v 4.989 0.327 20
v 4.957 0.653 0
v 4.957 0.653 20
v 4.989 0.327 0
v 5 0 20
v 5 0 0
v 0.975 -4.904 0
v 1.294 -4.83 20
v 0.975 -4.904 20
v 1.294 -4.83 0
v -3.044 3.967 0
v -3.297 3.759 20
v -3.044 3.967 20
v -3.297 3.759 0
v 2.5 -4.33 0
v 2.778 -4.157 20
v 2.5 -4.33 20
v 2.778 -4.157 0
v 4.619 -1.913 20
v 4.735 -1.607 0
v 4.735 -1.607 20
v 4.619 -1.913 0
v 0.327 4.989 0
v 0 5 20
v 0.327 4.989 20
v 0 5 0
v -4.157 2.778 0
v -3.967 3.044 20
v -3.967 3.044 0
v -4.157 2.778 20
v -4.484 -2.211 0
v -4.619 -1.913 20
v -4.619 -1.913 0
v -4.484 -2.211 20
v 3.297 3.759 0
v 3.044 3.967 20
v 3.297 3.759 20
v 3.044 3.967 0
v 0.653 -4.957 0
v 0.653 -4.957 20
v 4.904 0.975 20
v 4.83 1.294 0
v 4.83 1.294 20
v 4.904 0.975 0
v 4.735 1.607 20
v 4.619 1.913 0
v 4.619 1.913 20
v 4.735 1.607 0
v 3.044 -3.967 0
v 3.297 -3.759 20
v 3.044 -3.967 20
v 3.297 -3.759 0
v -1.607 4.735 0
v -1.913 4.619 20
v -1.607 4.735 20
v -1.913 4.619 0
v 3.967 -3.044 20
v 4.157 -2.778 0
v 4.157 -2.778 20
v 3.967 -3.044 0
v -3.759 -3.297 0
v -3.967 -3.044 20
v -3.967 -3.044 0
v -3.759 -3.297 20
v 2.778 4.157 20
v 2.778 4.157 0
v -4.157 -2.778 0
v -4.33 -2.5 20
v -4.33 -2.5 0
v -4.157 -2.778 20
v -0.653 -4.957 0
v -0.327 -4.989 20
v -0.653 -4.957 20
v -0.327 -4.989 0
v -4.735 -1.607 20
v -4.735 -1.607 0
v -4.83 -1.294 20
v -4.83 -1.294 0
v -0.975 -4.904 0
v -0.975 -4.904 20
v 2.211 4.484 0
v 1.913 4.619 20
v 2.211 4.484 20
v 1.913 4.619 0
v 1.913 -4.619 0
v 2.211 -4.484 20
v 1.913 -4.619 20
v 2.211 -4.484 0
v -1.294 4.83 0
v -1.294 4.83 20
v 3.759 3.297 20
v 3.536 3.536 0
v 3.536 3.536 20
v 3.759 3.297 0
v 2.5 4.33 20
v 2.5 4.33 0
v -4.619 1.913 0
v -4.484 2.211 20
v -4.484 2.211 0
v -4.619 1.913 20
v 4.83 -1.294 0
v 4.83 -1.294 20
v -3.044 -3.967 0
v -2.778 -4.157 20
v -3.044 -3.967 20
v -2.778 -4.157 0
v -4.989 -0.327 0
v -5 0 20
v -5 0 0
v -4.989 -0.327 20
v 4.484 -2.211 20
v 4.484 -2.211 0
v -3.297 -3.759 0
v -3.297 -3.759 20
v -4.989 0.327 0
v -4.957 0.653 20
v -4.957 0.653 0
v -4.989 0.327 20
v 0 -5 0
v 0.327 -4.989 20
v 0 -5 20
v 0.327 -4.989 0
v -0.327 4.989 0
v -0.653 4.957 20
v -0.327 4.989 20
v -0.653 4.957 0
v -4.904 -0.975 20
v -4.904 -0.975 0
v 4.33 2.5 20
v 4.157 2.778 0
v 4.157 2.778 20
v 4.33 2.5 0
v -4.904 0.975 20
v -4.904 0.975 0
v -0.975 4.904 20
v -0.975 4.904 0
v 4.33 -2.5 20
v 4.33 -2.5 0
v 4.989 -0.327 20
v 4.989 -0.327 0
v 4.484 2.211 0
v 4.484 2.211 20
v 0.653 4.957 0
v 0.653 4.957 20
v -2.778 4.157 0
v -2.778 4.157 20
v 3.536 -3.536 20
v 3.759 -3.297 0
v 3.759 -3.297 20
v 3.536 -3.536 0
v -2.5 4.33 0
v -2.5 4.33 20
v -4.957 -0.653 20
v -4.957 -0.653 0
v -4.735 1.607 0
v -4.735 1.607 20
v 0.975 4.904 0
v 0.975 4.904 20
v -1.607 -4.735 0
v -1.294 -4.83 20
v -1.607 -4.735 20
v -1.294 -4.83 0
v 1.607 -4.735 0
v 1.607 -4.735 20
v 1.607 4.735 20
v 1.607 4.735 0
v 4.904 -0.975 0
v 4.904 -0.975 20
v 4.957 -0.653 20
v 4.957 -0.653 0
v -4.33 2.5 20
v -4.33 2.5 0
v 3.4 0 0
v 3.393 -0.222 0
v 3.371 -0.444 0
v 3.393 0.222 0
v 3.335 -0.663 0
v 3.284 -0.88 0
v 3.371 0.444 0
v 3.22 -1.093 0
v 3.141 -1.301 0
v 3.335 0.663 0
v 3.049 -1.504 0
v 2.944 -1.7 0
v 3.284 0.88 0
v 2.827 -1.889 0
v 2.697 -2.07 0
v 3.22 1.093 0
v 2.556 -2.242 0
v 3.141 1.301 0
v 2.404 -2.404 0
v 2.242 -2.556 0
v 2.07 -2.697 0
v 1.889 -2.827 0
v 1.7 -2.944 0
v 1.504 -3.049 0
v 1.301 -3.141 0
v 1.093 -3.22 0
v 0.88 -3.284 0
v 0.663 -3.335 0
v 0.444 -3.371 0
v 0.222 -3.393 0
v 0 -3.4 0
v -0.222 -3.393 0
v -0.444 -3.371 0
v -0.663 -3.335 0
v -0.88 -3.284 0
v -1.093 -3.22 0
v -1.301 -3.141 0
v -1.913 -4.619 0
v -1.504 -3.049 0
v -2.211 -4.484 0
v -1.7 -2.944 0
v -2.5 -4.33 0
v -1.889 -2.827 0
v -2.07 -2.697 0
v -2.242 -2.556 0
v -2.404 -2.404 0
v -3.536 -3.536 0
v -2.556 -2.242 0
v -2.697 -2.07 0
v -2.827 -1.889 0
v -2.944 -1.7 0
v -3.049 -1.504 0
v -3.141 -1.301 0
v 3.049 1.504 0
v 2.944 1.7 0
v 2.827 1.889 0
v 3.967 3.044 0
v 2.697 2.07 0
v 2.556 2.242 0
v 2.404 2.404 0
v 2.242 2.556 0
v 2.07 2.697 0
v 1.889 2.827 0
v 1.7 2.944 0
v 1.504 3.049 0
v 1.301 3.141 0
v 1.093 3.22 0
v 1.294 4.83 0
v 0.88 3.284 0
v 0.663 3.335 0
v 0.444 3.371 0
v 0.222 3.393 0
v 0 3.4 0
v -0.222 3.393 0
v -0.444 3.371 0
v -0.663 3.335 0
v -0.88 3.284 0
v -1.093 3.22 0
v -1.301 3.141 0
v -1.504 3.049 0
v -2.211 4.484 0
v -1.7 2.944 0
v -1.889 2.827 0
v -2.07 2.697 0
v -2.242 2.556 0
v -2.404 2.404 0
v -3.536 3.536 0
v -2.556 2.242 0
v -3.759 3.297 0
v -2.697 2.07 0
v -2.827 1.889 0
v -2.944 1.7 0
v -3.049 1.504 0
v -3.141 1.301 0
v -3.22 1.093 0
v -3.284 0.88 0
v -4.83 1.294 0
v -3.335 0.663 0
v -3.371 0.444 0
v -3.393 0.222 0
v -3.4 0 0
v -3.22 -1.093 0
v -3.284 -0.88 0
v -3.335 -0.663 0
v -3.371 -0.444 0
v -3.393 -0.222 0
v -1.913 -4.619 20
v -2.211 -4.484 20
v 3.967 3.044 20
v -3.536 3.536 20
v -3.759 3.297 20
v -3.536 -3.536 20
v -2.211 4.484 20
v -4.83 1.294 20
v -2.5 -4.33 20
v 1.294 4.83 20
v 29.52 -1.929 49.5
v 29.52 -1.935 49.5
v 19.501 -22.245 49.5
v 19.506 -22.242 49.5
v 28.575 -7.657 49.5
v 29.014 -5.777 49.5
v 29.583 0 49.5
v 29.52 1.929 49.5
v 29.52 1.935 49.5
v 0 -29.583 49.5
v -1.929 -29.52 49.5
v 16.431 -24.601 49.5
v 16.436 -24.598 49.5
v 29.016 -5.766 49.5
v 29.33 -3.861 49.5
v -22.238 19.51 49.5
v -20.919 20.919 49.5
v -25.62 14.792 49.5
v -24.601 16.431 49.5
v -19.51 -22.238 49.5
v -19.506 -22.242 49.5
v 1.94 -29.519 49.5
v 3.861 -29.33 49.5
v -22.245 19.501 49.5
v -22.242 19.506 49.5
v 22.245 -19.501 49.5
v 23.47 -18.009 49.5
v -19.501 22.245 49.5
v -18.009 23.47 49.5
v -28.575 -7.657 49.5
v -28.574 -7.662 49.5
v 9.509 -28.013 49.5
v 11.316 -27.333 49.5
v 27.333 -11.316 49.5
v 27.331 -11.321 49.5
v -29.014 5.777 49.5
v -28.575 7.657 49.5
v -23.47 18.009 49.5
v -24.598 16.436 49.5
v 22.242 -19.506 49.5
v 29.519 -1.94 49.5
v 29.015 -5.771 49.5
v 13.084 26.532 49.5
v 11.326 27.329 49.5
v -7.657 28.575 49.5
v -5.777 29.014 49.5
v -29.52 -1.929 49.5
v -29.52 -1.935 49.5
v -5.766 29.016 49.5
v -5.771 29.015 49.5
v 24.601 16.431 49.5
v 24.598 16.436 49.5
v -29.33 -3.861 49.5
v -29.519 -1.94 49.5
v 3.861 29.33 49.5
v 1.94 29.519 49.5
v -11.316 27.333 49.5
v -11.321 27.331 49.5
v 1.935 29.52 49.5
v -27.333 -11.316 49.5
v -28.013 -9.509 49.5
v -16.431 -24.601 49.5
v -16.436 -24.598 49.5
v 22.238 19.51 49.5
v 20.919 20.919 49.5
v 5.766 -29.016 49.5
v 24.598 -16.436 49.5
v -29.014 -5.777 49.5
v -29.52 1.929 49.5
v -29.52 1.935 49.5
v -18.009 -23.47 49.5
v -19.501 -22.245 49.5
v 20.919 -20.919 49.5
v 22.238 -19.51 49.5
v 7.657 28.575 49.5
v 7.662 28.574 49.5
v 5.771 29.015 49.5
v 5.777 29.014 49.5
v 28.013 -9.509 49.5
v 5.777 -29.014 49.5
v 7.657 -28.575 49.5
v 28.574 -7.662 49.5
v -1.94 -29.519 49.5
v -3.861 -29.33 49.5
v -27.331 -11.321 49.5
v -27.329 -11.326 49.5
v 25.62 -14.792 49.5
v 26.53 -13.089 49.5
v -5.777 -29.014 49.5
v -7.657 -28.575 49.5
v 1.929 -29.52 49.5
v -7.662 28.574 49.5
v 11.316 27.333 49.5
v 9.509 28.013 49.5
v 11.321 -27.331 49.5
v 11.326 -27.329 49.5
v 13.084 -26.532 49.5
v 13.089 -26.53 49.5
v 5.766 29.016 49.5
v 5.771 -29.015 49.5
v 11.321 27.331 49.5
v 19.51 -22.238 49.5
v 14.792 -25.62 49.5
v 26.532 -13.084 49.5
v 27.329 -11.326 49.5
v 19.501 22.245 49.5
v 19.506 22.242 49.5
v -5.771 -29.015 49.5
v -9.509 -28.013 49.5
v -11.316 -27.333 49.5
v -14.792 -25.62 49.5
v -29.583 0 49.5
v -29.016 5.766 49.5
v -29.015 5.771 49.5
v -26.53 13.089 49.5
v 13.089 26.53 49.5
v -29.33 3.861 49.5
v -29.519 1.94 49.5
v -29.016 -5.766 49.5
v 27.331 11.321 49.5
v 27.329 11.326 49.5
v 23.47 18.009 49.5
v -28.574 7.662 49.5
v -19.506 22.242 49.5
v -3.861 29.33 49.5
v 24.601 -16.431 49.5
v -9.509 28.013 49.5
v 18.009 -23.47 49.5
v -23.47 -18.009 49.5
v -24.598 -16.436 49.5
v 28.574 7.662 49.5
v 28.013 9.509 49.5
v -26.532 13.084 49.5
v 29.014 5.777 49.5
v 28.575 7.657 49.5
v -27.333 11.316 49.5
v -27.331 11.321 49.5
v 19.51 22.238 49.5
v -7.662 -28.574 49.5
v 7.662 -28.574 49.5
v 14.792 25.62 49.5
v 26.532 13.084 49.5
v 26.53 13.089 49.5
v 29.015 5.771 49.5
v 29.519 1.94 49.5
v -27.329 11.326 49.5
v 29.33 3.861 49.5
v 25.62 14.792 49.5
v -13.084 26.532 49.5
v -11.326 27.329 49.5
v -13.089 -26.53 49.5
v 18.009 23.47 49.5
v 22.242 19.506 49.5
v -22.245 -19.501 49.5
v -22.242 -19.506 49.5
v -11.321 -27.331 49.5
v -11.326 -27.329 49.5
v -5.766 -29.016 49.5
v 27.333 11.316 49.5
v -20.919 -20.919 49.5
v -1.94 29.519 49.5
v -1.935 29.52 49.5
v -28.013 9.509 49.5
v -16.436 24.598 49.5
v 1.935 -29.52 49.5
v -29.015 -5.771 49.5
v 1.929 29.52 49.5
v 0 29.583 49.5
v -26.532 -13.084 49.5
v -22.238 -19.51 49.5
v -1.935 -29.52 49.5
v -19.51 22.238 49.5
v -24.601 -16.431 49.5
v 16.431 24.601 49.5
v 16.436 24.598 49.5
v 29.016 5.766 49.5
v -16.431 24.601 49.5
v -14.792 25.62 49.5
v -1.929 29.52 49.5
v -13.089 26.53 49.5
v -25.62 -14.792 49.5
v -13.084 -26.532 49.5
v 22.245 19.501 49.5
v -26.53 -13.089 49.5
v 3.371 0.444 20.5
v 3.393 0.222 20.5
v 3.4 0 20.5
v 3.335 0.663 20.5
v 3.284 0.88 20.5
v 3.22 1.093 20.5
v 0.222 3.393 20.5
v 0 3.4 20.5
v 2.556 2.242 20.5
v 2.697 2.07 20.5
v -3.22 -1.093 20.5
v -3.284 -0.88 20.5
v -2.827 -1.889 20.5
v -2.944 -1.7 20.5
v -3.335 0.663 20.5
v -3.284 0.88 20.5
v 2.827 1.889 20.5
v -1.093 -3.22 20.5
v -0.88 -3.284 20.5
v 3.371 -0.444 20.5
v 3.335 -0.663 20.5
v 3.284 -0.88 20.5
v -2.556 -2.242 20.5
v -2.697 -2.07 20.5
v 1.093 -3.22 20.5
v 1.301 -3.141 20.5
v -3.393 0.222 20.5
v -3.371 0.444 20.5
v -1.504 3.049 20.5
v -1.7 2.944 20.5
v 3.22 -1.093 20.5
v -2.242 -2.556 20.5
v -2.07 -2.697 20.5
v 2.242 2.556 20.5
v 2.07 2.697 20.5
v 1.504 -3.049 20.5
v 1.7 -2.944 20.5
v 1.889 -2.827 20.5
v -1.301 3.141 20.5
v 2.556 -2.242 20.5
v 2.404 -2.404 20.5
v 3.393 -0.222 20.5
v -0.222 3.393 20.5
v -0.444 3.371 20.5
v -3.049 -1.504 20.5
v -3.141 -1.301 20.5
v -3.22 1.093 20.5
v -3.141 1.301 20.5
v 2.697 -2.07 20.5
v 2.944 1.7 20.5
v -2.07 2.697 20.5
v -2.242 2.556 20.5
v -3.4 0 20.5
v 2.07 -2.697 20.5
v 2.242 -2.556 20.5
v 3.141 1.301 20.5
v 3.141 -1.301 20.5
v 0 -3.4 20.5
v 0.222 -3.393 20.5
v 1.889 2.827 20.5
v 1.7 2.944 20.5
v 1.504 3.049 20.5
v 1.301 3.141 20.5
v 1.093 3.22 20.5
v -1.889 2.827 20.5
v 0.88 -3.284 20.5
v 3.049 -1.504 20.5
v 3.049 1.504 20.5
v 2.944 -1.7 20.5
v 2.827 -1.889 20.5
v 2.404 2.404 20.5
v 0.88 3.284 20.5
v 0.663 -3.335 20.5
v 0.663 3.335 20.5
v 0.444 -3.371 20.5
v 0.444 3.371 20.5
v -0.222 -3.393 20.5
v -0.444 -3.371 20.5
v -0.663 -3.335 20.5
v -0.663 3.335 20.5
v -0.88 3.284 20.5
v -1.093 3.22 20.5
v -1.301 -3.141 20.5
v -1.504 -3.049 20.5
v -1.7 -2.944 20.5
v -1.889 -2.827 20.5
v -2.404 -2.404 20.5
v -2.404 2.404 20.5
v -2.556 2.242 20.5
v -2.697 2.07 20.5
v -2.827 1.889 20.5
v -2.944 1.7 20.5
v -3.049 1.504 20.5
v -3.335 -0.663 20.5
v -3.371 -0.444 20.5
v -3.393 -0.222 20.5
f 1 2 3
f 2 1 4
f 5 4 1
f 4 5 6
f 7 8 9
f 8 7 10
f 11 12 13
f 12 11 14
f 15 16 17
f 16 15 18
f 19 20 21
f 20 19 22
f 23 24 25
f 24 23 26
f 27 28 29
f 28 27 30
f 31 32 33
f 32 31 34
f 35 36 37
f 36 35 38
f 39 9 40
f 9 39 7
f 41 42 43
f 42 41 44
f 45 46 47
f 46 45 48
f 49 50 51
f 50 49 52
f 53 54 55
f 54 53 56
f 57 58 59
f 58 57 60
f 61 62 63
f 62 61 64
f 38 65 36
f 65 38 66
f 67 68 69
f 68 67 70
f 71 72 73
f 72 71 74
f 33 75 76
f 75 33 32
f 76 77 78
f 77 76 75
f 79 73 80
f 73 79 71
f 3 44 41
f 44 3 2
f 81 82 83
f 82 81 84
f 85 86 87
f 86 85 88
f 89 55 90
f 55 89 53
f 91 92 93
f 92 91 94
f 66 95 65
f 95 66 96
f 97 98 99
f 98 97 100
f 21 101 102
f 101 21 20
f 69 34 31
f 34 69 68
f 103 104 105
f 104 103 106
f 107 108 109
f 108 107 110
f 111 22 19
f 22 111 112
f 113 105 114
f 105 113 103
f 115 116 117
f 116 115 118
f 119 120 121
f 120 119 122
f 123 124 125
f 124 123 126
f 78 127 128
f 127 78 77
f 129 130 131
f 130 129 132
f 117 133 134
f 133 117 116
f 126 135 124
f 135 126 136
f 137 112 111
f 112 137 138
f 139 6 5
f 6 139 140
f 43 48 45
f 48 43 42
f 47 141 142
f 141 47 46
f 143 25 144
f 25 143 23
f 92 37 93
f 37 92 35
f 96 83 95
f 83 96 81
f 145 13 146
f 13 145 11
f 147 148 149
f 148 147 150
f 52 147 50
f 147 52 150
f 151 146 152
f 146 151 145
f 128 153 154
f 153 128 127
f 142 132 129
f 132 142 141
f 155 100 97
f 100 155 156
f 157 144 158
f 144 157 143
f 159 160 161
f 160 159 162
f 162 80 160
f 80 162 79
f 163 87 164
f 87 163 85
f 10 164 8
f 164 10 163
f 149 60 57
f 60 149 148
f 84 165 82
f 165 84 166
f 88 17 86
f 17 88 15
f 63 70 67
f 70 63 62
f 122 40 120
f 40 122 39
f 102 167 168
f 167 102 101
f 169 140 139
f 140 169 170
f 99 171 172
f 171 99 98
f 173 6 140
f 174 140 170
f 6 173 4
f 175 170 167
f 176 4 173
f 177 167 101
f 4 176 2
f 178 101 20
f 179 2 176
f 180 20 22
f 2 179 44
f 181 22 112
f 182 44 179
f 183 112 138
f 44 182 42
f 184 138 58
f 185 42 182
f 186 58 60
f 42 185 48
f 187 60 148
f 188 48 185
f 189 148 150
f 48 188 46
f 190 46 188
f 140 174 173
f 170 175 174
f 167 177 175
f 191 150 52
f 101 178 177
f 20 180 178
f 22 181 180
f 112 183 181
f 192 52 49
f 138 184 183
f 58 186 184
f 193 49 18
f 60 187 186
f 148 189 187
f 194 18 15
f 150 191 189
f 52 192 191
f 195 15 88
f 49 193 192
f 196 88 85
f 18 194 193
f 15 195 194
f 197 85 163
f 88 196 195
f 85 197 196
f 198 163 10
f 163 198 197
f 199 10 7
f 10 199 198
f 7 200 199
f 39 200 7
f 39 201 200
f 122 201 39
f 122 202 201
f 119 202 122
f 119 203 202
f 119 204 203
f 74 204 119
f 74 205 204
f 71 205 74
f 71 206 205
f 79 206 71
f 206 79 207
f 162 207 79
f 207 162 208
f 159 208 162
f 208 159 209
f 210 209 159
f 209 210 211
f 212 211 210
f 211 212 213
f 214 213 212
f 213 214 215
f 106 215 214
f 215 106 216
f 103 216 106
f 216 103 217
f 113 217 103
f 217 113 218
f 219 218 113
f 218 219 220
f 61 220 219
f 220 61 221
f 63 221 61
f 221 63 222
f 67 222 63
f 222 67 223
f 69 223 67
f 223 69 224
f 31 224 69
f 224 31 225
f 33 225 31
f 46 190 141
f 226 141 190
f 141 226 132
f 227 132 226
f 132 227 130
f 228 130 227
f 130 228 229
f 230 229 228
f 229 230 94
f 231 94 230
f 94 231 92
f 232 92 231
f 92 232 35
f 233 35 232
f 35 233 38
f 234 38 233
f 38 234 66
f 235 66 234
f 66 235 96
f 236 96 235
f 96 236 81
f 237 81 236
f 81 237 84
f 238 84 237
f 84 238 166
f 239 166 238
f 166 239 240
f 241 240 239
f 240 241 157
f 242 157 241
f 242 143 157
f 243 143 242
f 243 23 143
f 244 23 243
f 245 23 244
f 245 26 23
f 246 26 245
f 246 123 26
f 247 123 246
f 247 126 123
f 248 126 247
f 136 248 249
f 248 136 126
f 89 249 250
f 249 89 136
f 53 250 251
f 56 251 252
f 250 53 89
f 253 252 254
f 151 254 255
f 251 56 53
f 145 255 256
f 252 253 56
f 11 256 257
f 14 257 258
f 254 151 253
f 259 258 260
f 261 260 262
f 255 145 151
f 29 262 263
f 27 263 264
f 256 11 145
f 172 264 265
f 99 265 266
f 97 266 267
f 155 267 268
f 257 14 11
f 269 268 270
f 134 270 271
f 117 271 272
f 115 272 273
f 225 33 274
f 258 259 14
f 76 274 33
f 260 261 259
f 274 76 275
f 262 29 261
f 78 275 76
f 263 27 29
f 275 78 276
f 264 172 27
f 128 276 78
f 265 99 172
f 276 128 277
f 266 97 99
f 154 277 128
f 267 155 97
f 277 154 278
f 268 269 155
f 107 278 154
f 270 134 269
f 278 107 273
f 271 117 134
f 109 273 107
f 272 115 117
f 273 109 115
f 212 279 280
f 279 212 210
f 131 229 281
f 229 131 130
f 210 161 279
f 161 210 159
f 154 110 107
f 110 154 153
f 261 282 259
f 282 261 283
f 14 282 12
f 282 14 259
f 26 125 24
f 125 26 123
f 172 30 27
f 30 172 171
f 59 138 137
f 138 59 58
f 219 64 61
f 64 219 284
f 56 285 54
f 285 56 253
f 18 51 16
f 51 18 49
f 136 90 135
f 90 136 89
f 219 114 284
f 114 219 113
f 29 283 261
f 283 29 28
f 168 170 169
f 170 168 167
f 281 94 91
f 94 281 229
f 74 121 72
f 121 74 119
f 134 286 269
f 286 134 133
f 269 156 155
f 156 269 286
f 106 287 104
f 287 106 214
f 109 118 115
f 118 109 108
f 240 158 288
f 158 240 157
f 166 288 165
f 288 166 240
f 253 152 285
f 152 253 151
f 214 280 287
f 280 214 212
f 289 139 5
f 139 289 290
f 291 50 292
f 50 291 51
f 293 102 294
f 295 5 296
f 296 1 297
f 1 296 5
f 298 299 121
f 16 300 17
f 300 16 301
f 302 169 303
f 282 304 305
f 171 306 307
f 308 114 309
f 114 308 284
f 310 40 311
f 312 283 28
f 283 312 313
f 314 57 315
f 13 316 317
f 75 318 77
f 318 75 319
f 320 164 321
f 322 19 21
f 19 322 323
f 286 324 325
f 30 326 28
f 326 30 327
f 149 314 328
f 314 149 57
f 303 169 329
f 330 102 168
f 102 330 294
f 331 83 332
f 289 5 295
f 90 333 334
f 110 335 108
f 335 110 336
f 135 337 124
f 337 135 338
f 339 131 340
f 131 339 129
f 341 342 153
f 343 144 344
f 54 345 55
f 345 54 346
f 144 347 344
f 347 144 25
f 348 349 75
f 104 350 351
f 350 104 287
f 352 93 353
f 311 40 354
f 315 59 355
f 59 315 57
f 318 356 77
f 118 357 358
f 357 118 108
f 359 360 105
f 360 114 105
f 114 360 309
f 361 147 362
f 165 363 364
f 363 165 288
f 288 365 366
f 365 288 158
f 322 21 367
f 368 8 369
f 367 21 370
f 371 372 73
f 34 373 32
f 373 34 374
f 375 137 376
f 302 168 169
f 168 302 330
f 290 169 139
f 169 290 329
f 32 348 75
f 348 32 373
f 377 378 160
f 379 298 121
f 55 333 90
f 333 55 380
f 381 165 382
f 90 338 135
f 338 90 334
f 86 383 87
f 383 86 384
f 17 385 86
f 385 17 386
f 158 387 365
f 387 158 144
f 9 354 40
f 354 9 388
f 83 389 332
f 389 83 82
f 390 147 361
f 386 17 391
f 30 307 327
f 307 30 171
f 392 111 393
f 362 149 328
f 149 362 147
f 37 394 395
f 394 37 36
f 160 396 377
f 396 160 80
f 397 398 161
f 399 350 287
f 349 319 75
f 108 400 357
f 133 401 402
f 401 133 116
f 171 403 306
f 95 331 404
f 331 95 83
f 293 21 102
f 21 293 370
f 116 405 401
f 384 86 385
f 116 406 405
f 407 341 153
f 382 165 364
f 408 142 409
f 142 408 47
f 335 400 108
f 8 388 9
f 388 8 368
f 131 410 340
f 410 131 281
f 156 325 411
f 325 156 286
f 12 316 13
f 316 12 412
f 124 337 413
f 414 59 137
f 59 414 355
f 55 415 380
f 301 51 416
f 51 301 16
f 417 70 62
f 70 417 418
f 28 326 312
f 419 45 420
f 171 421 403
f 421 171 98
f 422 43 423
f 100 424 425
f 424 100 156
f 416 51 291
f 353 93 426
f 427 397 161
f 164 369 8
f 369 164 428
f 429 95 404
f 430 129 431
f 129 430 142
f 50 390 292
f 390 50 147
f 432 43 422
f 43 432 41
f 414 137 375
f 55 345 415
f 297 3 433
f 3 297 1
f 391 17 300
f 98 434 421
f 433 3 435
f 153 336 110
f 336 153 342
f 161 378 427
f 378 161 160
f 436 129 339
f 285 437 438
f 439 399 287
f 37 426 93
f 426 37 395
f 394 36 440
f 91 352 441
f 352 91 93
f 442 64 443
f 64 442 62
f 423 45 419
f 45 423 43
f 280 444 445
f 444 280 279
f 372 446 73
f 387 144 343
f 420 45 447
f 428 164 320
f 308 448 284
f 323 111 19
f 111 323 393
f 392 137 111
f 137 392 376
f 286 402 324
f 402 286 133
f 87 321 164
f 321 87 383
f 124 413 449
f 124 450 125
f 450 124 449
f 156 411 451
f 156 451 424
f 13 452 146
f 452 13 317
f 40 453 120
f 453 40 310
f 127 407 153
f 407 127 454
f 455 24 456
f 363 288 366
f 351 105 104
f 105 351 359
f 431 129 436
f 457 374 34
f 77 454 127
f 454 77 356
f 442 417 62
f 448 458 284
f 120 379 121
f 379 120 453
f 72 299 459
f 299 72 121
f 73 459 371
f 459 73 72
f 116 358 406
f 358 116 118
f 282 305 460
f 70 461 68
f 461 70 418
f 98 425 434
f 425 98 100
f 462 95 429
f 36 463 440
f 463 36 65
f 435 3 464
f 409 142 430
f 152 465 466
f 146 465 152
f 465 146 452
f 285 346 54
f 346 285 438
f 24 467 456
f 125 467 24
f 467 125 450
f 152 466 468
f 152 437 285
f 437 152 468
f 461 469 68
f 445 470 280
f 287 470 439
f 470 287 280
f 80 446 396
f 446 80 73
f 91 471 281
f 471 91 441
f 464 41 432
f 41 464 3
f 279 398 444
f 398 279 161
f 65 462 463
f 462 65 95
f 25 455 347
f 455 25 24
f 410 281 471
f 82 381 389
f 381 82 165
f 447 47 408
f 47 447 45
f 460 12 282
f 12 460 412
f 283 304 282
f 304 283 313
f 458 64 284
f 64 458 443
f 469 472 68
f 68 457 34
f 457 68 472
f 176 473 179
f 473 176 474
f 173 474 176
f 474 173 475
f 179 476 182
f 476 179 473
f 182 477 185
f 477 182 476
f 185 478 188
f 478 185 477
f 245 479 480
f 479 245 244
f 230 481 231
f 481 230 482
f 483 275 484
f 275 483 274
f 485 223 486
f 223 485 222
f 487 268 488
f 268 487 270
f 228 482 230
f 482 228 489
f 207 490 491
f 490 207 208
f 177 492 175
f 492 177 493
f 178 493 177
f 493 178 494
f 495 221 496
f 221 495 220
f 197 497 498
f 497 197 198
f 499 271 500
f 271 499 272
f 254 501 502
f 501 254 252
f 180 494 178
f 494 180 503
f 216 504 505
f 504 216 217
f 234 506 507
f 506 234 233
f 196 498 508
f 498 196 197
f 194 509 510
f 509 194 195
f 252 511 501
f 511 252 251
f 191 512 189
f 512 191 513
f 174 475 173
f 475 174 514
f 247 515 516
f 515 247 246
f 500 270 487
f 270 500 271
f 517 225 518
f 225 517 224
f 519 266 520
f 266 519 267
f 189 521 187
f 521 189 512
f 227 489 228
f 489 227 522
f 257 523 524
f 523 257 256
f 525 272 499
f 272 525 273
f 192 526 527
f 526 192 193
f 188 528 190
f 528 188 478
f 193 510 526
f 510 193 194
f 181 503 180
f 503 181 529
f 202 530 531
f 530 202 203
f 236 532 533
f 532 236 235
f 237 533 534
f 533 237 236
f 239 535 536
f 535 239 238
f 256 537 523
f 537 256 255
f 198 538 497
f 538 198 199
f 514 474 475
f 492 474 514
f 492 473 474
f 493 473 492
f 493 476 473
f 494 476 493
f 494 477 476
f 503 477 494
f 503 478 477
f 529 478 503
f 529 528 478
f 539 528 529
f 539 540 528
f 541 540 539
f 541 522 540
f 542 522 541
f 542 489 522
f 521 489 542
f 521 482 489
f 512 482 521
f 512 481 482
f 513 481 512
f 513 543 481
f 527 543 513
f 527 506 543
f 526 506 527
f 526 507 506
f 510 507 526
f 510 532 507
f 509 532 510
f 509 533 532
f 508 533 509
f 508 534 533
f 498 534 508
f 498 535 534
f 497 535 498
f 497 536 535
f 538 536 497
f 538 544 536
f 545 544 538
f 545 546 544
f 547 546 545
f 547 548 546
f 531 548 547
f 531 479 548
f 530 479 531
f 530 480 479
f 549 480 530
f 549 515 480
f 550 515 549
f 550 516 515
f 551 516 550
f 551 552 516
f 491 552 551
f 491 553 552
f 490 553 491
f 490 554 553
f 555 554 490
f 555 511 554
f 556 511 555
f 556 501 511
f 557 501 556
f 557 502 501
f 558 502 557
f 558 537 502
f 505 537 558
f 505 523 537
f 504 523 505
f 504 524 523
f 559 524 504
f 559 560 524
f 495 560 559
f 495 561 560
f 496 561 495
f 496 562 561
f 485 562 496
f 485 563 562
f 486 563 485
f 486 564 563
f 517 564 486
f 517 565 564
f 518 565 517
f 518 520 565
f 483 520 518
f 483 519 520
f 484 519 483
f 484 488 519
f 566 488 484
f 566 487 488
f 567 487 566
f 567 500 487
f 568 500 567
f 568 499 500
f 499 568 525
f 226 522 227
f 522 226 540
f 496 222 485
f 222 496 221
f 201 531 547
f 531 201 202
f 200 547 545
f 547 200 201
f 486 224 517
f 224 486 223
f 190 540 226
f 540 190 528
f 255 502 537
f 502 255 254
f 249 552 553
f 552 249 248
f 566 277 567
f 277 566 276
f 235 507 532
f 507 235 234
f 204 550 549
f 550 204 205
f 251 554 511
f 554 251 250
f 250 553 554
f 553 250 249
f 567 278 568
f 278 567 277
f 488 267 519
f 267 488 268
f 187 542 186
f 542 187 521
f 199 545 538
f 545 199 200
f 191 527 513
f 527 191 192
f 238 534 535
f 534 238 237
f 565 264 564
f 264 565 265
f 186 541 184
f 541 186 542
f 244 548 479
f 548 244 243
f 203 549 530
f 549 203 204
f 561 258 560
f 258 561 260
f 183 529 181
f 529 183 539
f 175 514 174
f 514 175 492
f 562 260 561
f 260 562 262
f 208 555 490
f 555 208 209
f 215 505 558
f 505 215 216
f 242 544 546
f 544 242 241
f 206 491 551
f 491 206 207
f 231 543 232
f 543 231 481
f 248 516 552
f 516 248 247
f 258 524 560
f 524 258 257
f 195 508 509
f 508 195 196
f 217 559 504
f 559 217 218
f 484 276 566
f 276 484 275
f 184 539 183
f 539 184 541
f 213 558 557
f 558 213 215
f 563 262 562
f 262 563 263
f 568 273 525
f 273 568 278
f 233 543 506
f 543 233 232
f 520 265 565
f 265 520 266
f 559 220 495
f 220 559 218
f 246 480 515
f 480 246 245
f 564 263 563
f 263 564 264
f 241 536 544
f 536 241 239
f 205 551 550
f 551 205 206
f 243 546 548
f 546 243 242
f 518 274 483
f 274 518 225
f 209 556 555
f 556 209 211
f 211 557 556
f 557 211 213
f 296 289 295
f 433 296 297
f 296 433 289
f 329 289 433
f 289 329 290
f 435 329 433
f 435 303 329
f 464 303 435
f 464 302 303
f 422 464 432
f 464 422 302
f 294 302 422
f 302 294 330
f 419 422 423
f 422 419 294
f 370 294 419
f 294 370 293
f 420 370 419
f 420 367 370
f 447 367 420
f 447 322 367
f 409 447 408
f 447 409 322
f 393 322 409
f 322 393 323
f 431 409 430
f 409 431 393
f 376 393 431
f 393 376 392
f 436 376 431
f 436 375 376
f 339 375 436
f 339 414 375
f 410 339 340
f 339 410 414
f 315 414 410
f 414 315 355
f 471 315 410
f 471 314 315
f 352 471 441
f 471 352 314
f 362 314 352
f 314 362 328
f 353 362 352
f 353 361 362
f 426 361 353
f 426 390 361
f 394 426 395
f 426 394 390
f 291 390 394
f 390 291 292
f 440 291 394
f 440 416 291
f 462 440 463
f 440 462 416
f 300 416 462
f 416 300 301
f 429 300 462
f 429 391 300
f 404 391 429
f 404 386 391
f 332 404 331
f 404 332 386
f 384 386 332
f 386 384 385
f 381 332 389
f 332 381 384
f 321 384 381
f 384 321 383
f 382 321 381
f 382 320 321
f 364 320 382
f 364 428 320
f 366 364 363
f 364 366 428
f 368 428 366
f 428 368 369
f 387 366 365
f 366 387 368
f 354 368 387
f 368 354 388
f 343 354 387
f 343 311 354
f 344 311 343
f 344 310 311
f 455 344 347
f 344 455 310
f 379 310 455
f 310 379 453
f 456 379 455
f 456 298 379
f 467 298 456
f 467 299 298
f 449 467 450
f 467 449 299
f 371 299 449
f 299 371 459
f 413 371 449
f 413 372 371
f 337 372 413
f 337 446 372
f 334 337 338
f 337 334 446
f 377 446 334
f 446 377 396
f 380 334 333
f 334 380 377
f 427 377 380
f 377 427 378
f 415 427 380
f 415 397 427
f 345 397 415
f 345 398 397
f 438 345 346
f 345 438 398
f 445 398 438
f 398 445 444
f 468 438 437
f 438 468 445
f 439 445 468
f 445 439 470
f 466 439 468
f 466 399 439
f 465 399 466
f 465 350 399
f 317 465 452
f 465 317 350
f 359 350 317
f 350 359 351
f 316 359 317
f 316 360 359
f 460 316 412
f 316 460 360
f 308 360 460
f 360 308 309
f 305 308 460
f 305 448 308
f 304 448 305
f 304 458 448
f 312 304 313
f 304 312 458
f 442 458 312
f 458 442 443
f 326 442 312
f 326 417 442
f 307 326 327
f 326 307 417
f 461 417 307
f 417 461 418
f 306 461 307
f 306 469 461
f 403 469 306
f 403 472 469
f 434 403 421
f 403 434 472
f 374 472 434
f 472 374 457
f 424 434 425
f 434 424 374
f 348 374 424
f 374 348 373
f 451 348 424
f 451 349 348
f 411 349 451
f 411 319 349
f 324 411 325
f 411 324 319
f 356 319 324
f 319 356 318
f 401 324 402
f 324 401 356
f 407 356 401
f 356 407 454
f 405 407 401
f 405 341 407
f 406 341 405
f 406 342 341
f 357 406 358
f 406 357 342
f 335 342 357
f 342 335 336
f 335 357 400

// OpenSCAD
// Lab funnel - printed upright, open at top and bottom
// Units: mm

$fn = 96;

// --- Dimensions ---
spout_od      = 10;    // spout outer diameter
spout_len     = 20;    // spout length (z = 0 to 20)
cone_bottom_d = 10;    // cone outer diameter at z = 20
cone_rim_d    = 60;    // cone outer diameter at z = 50
rim_z         = 50;    // rim height
wall          = 1.6;   // wall thickness everywhere
eps           = 0.5;   // cutter overshoot

bore_d = spout_od - 2 * wall;  // spout bore (6.8 mm)

// --- Model ---
difference() {
    union() {
        // Spout
        cylinder(d = spout_od, h = spout_len);
        // Cone
        translate([0, 0, spout_len])
            cylinder(d1 = cone_bottom_d, d2 = cone_rim_d, h = rim_z - spout_len);
    }
    // Bottom cutter (through bore)
    translate([0, 0, -eps])
        cylinder(d = bore_d, h = spout_len + 2 * eps);
    // Top cutter (open rim)
    translate([0, 0, rim_z - eps])
        cylinder(d = cone_rim_d, h = eps + 1);
}
